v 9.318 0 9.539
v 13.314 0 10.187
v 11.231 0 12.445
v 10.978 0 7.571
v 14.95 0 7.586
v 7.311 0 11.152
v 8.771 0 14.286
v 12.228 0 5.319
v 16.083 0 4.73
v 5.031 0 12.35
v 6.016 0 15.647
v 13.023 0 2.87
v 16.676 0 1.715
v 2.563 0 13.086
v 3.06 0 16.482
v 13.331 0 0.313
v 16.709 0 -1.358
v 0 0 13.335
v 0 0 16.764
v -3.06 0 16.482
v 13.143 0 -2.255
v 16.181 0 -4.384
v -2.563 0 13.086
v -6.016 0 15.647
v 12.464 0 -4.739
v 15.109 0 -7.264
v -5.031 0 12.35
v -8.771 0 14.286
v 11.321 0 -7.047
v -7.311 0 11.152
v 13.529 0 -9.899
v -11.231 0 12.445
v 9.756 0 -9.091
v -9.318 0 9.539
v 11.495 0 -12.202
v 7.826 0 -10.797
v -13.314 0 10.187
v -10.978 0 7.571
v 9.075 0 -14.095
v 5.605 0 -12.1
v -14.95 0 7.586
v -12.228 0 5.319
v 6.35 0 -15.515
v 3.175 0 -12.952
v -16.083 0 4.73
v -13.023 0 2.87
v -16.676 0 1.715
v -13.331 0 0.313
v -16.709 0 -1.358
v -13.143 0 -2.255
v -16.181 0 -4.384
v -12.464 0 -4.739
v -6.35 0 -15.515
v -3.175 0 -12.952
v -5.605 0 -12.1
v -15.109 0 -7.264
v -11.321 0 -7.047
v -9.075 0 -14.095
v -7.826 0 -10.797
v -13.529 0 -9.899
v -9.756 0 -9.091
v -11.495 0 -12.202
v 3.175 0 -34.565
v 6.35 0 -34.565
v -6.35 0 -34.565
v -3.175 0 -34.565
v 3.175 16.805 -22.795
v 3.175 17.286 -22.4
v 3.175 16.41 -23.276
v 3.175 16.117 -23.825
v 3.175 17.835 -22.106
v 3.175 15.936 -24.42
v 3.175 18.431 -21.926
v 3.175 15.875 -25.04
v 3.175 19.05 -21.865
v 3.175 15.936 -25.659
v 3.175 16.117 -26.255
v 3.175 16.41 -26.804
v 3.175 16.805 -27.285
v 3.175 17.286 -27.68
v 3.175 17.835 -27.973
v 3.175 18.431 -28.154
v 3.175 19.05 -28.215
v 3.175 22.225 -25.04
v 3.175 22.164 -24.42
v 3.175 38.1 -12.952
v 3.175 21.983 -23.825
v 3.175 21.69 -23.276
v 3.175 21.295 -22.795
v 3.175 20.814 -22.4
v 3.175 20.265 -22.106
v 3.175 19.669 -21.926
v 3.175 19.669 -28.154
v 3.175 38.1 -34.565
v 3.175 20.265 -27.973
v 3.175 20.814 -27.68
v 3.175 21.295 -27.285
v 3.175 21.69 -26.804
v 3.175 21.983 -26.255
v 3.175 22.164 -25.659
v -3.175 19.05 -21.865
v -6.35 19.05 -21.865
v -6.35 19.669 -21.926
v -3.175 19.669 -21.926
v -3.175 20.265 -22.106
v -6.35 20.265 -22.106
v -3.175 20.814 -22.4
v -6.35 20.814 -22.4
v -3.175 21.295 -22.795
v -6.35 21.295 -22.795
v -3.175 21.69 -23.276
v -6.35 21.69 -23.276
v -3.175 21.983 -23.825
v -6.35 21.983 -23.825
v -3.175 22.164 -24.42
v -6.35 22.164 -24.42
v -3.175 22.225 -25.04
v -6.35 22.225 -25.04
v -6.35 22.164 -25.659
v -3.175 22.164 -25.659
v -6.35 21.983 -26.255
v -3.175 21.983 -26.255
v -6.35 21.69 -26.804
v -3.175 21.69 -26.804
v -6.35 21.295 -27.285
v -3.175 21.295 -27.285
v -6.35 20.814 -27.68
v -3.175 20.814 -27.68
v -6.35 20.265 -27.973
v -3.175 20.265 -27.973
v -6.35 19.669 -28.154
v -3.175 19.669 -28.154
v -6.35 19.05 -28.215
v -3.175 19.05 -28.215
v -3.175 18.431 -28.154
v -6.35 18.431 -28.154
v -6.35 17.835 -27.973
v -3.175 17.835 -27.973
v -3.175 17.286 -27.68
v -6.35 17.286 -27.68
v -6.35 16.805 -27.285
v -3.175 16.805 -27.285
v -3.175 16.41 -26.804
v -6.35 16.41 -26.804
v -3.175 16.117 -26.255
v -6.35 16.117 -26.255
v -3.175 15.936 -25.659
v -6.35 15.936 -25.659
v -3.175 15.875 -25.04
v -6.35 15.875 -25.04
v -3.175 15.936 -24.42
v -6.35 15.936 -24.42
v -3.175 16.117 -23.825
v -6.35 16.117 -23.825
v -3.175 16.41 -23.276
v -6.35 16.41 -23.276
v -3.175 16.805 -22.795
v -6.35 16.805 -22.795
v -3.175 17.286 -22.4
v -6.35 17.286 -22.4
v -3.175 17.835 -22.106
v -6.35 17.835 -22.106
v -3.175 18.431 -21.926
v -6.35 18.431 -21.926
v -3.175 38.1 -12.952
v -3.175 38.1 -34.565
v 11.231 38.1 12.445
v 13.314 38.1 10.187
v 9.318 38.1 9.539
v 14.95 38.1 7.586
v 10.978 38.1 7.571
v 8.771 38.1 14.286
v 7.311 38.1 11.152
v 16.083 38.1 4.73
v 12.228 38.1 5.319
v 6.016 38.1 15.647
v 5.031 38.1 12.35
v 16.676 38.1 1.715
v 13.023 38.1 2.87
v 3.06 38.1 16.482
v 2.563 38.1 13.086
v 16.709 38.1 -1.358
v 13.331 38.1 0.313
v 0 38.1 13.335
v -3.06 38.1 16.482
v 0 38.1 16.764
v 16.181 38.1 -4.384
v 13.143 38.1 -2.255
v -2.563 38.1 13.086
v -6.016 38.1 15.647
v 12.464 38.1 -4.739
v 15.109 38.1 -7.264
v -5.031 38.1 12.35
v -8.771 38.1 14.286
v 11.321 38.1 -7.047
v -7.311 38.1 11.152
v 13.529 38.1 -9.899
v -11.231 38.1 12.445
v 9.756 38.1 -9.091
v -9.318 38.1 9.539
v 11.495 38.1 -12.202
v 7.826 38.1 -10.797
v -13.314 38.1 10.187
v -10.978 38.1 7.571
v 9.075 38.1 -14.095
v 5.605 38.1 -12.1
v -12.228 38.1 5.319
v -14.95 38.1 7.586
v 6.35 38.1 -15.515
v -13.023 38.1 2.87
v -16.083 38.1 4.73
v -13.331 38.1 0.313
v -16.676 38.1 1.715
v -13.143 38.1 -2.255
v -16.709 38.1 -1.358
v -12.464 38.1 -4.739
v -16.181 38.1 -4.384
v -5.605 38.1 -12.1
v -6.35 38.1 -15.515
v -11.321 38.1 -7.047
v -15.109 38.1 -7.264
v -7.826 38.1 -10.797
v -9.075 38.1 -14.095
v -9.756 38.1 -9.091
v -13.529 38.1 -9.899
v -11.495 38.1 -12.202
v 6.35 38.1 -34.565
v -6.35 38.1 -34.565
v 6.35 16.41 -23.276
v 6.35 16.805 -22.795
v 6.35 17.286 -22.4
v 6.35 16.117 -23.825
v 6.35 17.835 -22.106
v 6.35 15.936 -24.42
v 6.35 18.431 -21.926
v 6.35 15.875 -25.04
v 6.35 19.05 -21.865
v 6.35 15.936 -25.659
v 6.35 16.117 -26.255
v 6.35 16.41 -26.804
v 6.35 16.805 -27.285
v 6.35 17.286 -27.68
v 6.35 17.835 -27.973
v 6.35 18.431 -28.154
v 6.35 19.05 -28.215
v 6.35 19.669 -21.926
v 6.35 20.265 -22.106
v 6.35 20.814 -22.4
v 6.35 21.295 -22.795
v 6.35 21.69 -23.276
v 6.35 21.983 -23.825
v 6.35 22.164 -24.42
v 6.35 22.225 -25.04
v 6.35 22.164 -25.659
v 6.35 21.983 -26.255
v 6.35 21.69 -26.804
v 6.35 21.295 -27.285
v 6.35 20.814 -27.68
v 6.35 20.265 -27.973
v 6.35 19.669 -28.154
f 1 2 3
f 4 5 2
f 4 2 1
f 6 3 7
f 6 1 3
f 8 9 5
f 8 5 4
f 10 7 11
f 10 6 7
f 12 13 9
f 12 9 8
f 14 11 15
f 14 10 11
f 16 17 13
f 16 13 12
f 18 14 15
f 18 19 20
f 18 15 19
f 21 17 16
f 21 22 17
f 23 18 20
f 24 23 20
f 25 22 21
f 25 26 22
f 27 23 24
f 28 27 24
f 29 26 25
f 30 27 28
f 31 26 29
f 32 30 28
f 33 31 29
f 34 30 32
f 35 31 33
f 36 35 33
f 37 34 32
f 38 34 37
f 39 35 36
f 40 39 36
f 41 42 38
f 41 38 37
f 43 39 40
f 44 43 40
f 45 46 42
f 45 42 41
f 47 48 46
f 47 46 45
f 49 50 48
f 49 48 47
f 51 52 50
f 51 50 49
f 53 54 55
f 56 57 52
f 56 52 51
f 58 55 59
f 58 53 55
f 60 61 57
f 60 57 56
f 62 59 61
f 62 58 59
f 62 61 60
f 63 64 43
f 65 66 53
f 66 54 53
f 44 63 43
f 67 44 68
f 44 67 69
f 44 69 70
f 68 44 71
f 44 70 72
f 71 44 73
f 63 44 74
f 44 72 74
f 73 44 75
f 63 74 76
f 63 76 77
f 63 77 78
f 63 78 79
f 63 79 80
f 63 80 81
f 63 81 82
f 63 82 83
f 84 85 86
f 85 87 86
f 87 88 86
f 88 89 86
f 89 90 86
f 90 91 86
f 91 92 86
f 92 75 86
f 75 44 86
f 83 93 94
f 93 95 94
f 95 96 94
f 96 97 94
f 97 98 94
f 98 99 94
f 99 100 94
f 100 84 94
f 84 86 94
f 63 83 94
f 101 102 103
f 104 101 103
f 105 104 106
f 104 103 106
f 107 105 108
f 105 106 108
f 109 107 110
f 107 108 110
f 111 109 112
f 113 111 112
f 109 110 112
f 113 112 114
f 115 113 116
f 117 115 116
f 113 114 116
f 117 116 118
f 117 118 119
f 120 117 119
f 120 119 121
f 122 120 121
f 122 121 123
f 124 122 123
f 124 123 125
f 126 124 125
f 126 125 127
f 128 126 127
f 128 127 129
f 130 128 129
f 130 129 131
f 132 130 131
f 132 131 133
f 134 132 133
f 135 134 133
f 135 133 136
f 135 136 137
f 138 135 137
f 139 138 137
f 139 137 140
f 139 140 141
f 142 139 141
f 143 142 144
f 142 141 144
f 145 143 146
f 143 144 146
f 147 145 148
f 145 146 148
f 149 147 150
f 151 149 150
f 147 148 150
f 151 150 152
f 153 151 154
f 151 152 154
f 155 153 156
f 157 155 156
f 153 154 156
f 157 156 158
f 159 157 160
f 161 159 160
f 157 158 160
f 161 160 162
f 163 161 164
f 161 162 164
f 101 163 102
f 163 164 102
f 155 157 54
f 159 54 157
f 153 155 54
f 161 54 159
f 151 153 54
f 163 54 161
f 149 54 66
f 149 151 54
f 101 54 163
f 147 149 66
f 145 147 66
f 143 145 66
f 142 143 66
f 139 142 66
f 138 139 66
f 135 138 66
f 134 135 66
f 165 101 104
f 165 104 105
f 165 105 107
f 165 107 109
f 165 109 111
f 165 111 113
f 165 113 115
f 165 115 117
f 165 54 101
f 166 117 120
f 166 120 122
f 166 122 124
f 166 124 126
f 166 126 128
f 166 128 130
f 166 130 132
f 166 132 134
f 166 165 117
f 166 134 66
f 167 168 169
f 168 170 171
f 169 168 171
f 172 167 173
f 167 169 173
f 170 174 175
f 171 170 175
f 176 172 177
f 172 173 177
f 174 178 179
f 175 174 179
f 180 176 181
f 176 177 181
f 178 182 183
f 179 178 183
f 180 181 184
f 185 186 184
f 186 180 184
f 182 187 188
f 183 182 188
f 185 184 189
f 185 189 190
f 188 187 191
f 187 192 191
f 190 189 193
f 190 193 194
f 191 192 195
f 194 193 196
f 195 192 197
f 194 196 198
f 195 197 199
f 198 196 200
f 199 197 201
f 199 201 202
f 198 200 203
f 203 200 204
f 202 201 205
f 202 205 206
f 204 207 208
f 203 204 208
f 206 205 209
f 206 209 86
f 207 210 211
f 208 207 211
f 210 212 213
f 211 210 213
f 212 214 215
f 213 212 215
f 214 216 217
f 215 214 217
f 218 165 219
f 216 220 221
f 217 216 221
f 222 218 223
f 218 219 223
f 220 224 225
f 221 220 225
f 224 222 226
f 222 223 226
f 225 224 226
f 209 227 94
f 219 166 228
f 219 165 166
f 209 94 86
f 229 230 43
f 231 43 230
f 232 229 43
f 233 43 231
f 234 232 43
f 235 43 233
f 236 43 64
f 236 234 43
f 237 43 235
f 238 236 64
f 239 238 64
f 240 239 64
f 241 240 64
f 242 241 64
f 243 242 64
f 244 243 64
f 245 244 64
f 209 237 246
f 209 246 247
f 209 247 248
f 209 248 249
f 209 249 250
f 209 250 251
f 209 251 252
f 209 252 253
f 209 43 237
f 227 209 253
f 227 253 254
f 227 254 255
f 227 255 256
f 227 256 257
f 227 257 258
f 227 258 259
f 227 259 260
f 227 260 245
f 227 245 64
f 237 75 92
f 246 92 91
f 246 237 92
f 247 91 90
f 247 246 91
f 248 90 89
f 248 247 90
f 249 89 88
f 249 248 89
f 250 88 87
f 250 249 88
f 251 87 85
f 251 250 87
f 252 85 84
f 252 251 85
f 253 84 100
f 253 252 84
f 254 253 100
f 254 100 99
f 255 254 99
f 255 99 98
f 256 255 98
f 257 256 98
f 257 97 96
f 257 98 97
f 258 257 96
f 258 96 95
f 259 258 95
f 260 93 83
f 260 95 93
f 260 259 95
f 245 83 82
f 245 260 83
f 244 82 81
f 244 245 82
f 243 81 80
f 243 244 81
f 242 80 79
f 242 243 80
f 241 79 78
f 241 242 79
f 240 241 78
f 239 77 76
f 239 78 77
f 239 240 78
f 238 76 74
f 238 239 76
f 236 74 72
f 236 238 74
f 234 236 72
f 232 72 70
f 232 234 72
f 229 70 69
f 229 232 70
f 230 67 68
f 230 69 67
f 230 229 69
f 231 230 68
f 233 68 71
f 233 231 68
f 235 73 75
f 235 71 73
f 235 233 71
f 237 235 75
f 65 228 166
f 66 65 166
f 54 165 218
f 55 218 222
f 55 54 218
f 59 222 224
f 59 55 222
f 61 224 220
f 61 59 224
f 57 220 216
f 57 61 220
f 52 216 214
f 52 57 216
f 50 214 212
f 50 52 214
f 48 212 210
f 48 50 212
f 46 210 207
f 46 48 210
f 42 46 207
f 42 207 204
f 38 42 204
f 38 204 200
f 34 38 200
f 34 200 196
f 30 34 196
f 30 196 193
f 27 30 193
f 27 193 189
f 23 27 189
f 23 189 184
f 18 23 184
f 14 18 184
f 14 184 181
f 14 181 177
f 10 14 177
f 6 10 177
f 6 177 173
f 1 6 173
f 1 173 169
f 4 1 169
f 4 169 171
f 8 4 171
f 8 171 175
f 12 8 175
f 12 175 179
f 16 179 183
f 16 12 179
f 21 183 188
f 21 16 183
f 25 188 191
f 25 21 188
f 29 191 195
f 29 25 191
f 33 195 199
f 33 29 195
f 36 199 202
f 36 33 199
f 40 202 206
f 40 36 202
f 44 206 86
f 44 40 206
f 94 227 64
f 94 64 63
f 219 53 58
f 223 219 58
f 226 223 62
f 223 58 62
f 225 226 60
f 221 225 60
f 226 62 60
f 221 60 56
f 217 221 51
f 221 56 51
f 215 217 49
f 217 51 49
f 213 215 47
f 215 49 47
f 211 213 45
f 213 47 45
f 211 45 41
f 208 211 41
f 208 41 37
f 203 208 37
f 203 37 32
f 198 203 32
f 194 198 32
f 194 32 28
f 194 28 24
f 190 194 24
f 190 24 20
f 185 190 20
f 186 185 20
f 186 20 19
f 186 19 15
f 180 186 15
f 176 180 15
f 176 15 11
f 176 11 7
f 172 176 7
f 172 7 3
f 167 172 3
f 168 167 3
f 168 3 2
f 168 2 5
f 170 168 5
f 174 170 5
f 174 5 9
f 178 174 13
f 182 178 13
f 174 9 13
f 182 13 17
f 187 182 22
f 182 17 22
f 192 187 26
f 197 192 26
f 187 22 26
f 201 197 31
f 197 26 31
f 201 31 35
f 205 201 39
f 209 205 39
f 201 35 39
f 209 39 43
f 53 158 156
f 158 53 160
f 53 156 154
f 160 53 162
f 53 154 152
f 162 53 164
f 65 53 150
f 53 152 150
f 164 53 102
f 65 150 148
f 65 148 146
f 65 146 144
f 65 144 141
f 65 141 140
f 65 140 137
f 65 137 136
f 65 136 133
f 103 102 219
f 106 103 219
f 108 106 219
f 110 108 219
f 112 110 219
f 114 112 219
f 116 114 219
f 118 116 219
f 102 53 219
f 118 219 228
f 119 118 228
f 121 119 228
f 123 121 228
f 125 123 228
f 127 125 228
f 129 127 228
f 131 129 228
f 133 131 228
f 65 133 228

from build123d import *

# Parameters (mm, degrees)
SKETCH1_R           = 16.764
SKETCH1_R_2         = 13.335
BOSS_EXTRUDE1_DEPTH = 38.1
SKETCH2_W           = 6.35
SKETCH2_H           = 3.812490435
CUT_EXTRUDE1_DEPTH  = 45.873972322
SKETCH3_W           = 3.175
SKETCH3_H           = 19.05
BOSS_EXTRUDE2_DEPTH = 38.1
SKETCH4_R           = 3.175
CUT_EXTRUDE2_DEPTH  = 57.396744492


with BuildPart() as part:
    # Sketch1 → Boss-Extrude1 (new body)
    with BuildSketch(Plane(origin=(0, 0, 0), x_dir=(1, 0, 0), z_dir=(0, 1, 0))):
        with Locations(Location((0, 0, 0), (0, 0, 90))):
            Circle(SKETCH1_R)
        with Locations(Location((0, 0, 0), (0, 0, 90))):
            Circle(SKETCH1_R_2, mode=Mode.SUBTRACT)
    extrude(amount=BOSS_EXTRUDE1_DEPTH)

    # Sketch2 → Cut-Extrude1 (cut, through all)
    with BuildSketch(Plane(origin=(0, 38.1, 0), x_dir=(1, 0, 0), z_dir=(0, 1, 0))):
        with Locations((0, 14.857754782)):
            Rectangle(SKETCH2_W, SKETCH2_H)
    extrude(amount=-CUT_EXTRUDE1_DEPTH, mode=Mode.SUBTRACT)

    # Sketch3 → Boss-Extrude2 (add)
    with BuildSketch(Plane(origin=(0, 38.1, 0), x_dir=(1, 0, 0), z_dir=(0, 1, 0))):
        with Locations((-4.7625, 25.039805703)):
            Rectangle(SKETCH3_W, SKETCH3_H)
    boss_extrude2 = extrude(amount=-BOSS_EXTRUDE2_DEPTH)

    # Sketch4 → Cut-Extrude2 (cut, through all)
    with BuildSketch(Plane.ZY.offset(6.35)):
        with Locations((-25.039805703, 19.05)):
            Circle(SKETCH4_R)
    cut_extrude2 = extrude(amount=-CUT_EXTRUDE2_DEPTH, mode=Mode.SUBTRACT)

    # Mirror1: Boss-Extrude2, Cut-Extrude2 across plane
    add(boss_extrude2.mirror(Plane(origin=(0, 0, 0), x_dir=(0, 0, 1), z_dir=(1, 0, 0))))
    add(cut_extrude2.mirror(Plane(origin=(0, 0, 0), x_dir=(0, 0, 1), z_dir=(1, 0, 0))), mode=Mode.SUBTRACT)


solid = part.part
